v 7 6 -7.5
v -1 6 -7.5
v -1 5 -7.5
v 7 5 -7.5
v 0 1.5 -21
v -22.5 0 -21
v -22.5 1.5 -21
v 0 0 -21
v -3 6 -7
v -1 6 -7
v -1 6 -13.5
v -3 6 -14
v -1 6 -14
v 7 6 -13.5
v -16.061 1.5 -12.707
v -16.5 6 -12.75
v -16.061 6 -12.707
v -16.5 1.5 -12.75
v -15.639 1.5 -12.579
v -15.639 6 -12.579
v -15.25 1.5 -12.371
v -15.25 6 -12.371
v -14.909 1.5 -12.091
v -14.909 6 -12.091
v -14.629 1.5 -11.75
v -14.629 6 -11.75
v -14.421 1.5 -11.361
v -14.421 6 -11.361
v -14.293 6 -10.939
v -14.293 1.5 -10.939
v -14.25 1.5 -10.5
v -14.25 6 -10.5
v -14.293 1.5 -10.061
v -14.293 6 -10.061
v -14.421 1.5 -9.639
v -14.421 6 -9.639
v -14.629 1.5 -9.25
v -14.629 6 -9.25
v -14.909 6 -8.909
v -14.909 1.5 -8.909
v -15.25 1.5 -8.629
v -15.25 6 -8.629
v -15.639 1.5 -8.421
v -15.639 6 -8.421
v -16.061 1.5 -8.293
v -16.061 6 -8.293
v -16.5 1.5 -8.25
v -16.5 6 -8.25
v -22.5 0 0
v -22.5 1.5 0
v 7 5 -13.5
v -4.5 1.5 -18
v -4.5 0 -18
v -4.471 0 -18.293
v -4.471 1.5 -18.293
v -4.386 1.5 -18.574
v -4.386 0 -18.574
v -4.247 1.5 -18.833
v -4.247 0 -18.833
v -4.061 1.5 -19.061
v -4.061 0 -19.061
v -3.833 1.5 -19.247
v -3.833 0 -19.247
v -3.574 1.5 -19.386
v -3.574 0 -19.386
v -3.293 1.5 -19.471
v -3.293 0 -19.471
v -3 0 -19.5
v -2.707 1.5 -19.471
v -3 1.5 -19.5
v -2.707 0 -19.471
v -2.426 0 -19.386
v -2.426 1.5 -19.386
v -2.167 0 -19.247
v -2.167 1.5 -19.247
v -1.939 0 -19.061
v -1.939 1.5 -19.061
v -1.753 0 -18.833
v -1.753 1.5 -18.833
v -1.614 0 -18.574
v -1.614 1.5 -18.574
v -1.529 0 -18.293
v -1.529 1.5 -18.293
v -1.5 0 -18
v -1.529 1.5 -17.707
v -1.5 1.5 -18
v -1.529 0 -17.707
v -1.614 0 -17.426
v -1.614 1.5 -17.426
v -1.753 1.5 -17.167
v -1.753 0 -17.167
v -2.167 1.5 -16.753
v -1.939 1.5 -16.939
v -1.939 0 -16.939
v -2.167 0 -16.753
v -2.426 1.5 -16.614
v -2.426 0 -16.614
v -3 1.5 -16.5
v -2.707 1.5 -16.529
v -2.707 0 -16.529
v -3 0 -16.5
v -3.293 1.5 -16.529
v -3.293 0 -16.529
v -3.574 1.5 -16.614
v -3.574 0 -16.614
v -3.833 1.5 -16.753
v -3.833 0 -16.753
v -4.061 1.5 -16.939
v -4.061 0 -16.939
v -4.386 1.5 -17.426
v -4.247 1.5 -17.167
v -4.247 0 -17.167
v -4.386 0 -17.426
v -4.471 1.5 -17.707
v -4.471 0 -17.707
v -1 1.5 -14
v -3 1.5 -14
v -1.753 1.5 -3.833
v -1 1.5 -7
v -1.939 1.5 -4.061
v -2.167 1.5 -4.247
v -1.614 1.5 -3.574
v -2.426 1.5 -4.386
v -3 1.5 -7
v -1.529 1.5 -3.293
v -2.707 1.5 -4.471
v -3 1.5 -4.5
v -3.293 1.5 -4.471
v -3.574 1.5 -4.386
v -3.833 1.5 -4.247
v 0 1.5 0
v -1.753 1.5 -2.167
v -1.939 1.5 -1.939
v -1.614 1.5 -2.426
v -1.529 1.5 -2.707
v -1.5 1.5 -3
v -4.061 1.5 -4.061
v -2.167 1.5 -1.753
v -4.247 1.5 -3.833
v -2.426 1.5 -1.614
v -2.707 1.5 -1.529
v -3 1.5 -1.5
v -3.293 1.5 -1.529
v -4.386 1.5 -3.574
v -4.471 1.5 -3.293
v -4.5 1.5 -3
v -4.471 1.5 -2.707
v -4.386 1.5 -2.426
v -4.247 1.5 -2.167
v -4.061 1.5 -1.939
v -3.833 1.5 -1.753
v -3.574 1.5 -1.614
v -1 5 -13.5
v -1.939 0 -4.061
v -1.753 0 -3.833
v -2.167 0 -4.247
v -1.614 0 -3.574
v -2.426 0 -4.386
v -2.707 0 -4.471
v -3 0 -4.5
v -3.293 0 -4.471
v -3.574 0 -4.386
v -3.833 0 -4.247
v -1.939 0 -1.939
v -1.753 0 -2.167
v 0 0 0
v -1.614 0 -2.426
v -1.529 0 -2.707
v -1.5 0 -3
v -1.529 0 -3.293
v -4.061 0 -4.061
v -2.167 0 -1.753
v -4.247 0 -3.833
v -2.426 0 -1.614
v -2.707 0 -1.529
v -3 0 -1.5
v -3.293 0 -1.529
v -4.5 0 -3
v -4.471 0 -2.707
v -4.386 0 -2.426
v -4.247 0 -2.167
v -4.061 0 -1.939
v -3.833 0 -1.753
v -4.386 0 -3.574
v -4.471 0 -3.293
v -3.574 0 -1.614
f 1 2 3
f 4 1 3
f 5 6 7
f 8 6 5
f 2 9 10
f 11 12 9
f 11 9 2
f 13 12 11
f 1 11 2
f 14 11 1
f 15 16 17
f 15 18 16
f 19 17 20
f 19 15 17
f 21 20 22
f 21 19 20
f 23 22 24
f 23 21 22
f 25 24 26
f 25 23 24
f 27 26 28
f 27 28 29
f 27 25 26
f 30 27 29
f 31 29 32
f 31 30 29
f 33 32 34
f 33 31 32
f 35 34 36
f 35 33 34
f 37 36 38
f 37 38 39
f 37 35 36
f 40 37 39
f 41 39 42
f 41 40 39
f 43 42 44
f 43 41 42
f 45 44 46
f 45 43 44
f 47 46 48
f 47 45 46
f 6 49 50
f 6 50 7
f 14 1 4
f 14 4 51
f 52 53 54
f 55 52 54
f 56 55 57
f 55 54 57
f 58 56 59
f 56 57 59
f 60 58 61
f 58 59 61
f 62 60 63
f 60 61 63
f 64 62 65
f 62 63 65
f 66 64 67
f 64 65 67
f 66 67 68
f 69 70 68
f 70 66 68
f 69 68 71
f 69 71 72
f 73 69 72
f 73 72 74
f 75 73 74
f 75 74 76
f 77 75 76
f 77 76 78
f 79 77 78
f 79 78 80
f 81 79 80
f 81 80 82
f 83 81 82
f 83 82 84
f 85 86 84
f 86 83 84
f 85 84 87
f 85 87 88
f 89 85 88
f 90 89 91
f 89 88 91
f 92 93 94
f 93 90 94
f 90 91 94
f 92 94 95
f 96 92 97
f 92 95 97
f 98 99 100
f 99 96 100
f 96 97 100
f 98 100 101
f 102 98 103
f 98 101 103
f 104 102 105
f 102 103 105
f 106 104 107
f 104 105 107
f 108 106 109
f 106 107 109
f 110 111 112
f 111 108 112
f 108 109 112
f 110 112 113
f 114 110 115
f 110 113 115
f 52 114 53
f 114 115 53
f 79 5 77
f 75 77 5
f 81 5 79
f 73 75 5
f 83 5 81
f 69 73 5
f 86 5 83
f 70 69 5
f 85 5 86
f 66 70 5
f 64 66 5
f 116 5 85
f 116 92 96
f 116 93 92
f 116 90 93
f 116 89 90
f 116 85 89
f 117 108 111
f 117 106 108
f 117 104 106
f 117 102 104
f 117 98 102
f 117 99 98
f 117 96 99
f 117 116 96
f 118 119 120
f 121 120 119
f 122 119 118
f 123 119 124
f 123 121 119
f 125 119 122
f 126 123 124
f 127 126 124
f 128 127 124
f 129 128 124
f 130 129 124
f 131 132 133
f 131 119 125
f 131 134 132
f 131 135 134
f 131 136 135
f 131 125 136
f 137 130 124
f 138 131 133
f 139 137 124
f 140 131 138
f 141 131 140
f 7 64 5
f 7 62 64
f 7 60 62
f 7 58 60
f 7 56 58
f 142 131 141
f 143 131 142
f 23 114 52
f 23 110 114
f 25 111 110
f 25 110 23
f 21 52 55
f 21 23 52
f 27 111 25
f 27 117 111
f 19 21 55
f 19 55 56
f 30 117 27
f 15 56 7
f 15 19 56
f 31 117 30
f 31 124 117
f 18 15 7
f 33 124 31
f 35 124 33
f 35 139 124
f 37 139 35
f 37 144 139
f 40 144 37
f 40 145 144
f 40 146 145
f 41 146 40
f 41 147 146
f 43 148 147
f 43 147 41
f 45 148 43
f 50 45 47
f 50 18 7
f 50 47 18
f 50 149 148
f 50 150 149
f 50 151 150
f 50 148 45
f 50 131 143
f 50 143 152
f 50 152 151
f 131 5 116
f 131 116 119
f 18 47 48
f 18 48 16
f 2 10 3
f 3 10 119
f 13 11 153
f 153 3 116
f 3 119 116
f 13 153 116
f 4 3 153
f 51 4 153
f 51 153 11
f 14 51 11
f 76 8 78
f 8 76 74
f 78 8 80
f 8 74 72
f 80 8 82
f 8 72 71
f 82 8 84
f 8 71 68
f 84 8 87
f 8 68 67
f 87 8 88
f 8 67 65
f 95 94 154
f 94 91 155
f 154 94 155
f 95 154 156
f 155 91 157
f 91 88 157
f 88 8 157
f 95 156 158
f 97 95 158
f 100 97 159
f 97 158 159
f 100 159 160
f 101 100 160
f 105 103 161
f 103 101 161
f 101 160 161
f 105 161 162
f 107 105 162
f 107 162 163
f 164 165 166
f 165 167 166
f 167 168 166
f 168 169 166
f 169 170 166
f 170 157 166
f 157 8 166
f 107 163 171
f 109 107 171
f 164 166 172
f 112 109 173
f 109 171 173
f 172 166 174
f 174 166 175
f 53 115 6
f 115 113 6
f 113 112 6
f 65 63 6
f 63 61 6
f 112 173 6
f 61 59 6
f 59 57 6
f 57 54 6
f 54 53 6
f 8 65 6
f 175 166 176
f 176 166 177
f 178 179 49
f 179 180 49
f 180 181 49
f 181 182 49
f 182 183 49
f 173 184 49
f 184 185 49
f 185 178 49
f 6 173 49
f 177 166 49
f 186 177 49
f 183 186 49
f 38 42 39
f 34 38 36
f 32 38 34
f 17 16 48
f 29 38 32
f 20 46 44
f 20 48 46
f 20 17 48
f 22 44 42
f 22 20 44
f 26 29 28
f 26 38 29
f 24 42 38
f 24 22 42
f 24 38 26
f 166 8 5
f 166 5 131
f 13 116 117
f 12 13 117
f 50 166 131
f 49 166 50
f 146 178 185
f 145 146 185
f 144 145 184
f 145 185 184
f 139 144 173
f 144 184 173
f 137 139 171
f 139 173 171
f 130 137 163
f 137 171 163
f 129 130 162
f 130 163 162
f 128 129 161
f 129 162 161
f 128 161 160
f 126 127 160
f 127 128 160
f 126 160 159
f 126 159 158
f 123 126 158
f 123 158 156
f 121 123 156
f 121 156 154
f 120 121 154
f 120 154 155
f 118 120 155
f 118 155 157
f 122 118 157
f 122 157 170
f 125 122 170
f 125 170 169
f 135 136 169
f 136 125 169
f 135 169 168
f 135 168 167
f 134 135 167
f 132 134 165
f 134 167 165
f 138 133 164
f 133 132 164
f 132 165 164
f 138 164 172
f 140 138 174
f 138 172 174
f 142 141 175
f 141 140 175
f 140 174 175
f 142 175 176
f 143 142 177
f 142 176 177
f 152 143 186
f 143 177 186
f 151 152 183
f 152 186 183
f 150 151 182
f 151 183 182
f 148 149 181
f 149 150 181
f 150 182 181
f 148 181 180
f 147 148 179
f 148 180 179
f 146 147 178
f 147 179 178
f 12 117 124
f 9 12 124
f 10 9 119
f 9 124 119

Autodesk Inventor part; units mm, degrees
ref_plane "YZ Plane" through (0, 0, 0) normal (1, 0, 0) x (0, 1, 0)
ref_plane "XZ Plane" through (0, 0, 0) normal (0, 1, 0) x (-1, 0, 0)
ref_plane "XY Plane" through (0, 0, 0) normal (0, 0, 1) x (1, 0, 0)
sketch "Sketch1" plane through (0, 0, 0) normal (0, 1, 0) x (-1, 0, 0)
  line L0 (0, 0) -> (22.5, 0)
  line L1 (22.5, 0) -> (22.5, -21)
  line L2 (22.5, -21) -> (0, -21)
  line L3 (0, -21) -> (0, 0)
  circle A0 centre (3, -3) radius 1.5
  circle A1 centre (3, -18) radius 1.5
  line L4 (22.5, -10.5) -> (0, -10.5)
  dimension "d0" = 21
  dimension "d1" = 22.5
  dimension "d2" = 3
  dimension "d5" = 3
  dimension "d8" = 3
  dimension "d25" = 15
  dimension "d26" = 3
extrude "Extrusion1" add sketch "Sketch1" along normal blind 1.5
sketch "Sketch2" plane through (0, 1.5, 0) normal (0, 1, 0) x (1, 0, 0)
  line L0 (-3, 7) -> (-1, 7)
  line L1 (-1, 7) -> (-1, 14)
  line L2 (-1, 14) -> (-3, 14)
  line L3 (-3, 14) -> (-3, 7)
  line L4 (-16.5, 8.25) -> (-16.5, 12.75)
  circle A0 centre (-16.5, 10.5) radius 2.25
  line L5 (-22.5, 21) -> (-22.5, 0) projected
  line L6 (-22.5, 10.5) -> (0, 10.5)
  line L7 (0, 0) -> (0, 21) projected
  dimension "d11" = 4.5
  dimension "d12" = 7
  dimension "d13" = 2
  dimension "d14" = 1
  dimension "d15" = 6
extrude "Extrusion2" add sketch "Sketch2" along normal blind 4.5 contours L3 L6 L1 L0 | A0 L4 L6 | L6 L4 A0 | L3 L2 L1 L6 picked at (-15.2379, 9.707) picked at (-15.707, 11.7621)
sketch "Sketch3" plane through (-1, 1.5, -7) normal (1, 0, 0) x (0, 0, -1)
  line L0 (0.5, 3.5) -> (6.5, 3.5)
  line L1 (6.5, 3.5) -> (6.5, 4.5)
  line L2 (6.5, 4.5) -> (0.5, 4.5)
  line L3 (0.5, 4.5) -> (0.5, 3.5)
  line L4 (-7, 0) -> (14, 0) projected
  line L5 (0, 4.5) -> (7, 4.5) projected
  line L6 (0, 0) -> (0, 4.5) projected
  line L7 (7, 0) -> (7, 4.5) projected
  point P0 (-7, -1.5)
  point P1 (0.5, 4)
  dimension "d18" = 6
  dimension "d19" = 1
  dimension "d21" = 0.5
  dimension "d22" = 0.5
extrude "Extrusion3" add sketch "Sketch3" along normal blind 8 contours L3 L2 L1 L0
properties part number "DS18B20"
